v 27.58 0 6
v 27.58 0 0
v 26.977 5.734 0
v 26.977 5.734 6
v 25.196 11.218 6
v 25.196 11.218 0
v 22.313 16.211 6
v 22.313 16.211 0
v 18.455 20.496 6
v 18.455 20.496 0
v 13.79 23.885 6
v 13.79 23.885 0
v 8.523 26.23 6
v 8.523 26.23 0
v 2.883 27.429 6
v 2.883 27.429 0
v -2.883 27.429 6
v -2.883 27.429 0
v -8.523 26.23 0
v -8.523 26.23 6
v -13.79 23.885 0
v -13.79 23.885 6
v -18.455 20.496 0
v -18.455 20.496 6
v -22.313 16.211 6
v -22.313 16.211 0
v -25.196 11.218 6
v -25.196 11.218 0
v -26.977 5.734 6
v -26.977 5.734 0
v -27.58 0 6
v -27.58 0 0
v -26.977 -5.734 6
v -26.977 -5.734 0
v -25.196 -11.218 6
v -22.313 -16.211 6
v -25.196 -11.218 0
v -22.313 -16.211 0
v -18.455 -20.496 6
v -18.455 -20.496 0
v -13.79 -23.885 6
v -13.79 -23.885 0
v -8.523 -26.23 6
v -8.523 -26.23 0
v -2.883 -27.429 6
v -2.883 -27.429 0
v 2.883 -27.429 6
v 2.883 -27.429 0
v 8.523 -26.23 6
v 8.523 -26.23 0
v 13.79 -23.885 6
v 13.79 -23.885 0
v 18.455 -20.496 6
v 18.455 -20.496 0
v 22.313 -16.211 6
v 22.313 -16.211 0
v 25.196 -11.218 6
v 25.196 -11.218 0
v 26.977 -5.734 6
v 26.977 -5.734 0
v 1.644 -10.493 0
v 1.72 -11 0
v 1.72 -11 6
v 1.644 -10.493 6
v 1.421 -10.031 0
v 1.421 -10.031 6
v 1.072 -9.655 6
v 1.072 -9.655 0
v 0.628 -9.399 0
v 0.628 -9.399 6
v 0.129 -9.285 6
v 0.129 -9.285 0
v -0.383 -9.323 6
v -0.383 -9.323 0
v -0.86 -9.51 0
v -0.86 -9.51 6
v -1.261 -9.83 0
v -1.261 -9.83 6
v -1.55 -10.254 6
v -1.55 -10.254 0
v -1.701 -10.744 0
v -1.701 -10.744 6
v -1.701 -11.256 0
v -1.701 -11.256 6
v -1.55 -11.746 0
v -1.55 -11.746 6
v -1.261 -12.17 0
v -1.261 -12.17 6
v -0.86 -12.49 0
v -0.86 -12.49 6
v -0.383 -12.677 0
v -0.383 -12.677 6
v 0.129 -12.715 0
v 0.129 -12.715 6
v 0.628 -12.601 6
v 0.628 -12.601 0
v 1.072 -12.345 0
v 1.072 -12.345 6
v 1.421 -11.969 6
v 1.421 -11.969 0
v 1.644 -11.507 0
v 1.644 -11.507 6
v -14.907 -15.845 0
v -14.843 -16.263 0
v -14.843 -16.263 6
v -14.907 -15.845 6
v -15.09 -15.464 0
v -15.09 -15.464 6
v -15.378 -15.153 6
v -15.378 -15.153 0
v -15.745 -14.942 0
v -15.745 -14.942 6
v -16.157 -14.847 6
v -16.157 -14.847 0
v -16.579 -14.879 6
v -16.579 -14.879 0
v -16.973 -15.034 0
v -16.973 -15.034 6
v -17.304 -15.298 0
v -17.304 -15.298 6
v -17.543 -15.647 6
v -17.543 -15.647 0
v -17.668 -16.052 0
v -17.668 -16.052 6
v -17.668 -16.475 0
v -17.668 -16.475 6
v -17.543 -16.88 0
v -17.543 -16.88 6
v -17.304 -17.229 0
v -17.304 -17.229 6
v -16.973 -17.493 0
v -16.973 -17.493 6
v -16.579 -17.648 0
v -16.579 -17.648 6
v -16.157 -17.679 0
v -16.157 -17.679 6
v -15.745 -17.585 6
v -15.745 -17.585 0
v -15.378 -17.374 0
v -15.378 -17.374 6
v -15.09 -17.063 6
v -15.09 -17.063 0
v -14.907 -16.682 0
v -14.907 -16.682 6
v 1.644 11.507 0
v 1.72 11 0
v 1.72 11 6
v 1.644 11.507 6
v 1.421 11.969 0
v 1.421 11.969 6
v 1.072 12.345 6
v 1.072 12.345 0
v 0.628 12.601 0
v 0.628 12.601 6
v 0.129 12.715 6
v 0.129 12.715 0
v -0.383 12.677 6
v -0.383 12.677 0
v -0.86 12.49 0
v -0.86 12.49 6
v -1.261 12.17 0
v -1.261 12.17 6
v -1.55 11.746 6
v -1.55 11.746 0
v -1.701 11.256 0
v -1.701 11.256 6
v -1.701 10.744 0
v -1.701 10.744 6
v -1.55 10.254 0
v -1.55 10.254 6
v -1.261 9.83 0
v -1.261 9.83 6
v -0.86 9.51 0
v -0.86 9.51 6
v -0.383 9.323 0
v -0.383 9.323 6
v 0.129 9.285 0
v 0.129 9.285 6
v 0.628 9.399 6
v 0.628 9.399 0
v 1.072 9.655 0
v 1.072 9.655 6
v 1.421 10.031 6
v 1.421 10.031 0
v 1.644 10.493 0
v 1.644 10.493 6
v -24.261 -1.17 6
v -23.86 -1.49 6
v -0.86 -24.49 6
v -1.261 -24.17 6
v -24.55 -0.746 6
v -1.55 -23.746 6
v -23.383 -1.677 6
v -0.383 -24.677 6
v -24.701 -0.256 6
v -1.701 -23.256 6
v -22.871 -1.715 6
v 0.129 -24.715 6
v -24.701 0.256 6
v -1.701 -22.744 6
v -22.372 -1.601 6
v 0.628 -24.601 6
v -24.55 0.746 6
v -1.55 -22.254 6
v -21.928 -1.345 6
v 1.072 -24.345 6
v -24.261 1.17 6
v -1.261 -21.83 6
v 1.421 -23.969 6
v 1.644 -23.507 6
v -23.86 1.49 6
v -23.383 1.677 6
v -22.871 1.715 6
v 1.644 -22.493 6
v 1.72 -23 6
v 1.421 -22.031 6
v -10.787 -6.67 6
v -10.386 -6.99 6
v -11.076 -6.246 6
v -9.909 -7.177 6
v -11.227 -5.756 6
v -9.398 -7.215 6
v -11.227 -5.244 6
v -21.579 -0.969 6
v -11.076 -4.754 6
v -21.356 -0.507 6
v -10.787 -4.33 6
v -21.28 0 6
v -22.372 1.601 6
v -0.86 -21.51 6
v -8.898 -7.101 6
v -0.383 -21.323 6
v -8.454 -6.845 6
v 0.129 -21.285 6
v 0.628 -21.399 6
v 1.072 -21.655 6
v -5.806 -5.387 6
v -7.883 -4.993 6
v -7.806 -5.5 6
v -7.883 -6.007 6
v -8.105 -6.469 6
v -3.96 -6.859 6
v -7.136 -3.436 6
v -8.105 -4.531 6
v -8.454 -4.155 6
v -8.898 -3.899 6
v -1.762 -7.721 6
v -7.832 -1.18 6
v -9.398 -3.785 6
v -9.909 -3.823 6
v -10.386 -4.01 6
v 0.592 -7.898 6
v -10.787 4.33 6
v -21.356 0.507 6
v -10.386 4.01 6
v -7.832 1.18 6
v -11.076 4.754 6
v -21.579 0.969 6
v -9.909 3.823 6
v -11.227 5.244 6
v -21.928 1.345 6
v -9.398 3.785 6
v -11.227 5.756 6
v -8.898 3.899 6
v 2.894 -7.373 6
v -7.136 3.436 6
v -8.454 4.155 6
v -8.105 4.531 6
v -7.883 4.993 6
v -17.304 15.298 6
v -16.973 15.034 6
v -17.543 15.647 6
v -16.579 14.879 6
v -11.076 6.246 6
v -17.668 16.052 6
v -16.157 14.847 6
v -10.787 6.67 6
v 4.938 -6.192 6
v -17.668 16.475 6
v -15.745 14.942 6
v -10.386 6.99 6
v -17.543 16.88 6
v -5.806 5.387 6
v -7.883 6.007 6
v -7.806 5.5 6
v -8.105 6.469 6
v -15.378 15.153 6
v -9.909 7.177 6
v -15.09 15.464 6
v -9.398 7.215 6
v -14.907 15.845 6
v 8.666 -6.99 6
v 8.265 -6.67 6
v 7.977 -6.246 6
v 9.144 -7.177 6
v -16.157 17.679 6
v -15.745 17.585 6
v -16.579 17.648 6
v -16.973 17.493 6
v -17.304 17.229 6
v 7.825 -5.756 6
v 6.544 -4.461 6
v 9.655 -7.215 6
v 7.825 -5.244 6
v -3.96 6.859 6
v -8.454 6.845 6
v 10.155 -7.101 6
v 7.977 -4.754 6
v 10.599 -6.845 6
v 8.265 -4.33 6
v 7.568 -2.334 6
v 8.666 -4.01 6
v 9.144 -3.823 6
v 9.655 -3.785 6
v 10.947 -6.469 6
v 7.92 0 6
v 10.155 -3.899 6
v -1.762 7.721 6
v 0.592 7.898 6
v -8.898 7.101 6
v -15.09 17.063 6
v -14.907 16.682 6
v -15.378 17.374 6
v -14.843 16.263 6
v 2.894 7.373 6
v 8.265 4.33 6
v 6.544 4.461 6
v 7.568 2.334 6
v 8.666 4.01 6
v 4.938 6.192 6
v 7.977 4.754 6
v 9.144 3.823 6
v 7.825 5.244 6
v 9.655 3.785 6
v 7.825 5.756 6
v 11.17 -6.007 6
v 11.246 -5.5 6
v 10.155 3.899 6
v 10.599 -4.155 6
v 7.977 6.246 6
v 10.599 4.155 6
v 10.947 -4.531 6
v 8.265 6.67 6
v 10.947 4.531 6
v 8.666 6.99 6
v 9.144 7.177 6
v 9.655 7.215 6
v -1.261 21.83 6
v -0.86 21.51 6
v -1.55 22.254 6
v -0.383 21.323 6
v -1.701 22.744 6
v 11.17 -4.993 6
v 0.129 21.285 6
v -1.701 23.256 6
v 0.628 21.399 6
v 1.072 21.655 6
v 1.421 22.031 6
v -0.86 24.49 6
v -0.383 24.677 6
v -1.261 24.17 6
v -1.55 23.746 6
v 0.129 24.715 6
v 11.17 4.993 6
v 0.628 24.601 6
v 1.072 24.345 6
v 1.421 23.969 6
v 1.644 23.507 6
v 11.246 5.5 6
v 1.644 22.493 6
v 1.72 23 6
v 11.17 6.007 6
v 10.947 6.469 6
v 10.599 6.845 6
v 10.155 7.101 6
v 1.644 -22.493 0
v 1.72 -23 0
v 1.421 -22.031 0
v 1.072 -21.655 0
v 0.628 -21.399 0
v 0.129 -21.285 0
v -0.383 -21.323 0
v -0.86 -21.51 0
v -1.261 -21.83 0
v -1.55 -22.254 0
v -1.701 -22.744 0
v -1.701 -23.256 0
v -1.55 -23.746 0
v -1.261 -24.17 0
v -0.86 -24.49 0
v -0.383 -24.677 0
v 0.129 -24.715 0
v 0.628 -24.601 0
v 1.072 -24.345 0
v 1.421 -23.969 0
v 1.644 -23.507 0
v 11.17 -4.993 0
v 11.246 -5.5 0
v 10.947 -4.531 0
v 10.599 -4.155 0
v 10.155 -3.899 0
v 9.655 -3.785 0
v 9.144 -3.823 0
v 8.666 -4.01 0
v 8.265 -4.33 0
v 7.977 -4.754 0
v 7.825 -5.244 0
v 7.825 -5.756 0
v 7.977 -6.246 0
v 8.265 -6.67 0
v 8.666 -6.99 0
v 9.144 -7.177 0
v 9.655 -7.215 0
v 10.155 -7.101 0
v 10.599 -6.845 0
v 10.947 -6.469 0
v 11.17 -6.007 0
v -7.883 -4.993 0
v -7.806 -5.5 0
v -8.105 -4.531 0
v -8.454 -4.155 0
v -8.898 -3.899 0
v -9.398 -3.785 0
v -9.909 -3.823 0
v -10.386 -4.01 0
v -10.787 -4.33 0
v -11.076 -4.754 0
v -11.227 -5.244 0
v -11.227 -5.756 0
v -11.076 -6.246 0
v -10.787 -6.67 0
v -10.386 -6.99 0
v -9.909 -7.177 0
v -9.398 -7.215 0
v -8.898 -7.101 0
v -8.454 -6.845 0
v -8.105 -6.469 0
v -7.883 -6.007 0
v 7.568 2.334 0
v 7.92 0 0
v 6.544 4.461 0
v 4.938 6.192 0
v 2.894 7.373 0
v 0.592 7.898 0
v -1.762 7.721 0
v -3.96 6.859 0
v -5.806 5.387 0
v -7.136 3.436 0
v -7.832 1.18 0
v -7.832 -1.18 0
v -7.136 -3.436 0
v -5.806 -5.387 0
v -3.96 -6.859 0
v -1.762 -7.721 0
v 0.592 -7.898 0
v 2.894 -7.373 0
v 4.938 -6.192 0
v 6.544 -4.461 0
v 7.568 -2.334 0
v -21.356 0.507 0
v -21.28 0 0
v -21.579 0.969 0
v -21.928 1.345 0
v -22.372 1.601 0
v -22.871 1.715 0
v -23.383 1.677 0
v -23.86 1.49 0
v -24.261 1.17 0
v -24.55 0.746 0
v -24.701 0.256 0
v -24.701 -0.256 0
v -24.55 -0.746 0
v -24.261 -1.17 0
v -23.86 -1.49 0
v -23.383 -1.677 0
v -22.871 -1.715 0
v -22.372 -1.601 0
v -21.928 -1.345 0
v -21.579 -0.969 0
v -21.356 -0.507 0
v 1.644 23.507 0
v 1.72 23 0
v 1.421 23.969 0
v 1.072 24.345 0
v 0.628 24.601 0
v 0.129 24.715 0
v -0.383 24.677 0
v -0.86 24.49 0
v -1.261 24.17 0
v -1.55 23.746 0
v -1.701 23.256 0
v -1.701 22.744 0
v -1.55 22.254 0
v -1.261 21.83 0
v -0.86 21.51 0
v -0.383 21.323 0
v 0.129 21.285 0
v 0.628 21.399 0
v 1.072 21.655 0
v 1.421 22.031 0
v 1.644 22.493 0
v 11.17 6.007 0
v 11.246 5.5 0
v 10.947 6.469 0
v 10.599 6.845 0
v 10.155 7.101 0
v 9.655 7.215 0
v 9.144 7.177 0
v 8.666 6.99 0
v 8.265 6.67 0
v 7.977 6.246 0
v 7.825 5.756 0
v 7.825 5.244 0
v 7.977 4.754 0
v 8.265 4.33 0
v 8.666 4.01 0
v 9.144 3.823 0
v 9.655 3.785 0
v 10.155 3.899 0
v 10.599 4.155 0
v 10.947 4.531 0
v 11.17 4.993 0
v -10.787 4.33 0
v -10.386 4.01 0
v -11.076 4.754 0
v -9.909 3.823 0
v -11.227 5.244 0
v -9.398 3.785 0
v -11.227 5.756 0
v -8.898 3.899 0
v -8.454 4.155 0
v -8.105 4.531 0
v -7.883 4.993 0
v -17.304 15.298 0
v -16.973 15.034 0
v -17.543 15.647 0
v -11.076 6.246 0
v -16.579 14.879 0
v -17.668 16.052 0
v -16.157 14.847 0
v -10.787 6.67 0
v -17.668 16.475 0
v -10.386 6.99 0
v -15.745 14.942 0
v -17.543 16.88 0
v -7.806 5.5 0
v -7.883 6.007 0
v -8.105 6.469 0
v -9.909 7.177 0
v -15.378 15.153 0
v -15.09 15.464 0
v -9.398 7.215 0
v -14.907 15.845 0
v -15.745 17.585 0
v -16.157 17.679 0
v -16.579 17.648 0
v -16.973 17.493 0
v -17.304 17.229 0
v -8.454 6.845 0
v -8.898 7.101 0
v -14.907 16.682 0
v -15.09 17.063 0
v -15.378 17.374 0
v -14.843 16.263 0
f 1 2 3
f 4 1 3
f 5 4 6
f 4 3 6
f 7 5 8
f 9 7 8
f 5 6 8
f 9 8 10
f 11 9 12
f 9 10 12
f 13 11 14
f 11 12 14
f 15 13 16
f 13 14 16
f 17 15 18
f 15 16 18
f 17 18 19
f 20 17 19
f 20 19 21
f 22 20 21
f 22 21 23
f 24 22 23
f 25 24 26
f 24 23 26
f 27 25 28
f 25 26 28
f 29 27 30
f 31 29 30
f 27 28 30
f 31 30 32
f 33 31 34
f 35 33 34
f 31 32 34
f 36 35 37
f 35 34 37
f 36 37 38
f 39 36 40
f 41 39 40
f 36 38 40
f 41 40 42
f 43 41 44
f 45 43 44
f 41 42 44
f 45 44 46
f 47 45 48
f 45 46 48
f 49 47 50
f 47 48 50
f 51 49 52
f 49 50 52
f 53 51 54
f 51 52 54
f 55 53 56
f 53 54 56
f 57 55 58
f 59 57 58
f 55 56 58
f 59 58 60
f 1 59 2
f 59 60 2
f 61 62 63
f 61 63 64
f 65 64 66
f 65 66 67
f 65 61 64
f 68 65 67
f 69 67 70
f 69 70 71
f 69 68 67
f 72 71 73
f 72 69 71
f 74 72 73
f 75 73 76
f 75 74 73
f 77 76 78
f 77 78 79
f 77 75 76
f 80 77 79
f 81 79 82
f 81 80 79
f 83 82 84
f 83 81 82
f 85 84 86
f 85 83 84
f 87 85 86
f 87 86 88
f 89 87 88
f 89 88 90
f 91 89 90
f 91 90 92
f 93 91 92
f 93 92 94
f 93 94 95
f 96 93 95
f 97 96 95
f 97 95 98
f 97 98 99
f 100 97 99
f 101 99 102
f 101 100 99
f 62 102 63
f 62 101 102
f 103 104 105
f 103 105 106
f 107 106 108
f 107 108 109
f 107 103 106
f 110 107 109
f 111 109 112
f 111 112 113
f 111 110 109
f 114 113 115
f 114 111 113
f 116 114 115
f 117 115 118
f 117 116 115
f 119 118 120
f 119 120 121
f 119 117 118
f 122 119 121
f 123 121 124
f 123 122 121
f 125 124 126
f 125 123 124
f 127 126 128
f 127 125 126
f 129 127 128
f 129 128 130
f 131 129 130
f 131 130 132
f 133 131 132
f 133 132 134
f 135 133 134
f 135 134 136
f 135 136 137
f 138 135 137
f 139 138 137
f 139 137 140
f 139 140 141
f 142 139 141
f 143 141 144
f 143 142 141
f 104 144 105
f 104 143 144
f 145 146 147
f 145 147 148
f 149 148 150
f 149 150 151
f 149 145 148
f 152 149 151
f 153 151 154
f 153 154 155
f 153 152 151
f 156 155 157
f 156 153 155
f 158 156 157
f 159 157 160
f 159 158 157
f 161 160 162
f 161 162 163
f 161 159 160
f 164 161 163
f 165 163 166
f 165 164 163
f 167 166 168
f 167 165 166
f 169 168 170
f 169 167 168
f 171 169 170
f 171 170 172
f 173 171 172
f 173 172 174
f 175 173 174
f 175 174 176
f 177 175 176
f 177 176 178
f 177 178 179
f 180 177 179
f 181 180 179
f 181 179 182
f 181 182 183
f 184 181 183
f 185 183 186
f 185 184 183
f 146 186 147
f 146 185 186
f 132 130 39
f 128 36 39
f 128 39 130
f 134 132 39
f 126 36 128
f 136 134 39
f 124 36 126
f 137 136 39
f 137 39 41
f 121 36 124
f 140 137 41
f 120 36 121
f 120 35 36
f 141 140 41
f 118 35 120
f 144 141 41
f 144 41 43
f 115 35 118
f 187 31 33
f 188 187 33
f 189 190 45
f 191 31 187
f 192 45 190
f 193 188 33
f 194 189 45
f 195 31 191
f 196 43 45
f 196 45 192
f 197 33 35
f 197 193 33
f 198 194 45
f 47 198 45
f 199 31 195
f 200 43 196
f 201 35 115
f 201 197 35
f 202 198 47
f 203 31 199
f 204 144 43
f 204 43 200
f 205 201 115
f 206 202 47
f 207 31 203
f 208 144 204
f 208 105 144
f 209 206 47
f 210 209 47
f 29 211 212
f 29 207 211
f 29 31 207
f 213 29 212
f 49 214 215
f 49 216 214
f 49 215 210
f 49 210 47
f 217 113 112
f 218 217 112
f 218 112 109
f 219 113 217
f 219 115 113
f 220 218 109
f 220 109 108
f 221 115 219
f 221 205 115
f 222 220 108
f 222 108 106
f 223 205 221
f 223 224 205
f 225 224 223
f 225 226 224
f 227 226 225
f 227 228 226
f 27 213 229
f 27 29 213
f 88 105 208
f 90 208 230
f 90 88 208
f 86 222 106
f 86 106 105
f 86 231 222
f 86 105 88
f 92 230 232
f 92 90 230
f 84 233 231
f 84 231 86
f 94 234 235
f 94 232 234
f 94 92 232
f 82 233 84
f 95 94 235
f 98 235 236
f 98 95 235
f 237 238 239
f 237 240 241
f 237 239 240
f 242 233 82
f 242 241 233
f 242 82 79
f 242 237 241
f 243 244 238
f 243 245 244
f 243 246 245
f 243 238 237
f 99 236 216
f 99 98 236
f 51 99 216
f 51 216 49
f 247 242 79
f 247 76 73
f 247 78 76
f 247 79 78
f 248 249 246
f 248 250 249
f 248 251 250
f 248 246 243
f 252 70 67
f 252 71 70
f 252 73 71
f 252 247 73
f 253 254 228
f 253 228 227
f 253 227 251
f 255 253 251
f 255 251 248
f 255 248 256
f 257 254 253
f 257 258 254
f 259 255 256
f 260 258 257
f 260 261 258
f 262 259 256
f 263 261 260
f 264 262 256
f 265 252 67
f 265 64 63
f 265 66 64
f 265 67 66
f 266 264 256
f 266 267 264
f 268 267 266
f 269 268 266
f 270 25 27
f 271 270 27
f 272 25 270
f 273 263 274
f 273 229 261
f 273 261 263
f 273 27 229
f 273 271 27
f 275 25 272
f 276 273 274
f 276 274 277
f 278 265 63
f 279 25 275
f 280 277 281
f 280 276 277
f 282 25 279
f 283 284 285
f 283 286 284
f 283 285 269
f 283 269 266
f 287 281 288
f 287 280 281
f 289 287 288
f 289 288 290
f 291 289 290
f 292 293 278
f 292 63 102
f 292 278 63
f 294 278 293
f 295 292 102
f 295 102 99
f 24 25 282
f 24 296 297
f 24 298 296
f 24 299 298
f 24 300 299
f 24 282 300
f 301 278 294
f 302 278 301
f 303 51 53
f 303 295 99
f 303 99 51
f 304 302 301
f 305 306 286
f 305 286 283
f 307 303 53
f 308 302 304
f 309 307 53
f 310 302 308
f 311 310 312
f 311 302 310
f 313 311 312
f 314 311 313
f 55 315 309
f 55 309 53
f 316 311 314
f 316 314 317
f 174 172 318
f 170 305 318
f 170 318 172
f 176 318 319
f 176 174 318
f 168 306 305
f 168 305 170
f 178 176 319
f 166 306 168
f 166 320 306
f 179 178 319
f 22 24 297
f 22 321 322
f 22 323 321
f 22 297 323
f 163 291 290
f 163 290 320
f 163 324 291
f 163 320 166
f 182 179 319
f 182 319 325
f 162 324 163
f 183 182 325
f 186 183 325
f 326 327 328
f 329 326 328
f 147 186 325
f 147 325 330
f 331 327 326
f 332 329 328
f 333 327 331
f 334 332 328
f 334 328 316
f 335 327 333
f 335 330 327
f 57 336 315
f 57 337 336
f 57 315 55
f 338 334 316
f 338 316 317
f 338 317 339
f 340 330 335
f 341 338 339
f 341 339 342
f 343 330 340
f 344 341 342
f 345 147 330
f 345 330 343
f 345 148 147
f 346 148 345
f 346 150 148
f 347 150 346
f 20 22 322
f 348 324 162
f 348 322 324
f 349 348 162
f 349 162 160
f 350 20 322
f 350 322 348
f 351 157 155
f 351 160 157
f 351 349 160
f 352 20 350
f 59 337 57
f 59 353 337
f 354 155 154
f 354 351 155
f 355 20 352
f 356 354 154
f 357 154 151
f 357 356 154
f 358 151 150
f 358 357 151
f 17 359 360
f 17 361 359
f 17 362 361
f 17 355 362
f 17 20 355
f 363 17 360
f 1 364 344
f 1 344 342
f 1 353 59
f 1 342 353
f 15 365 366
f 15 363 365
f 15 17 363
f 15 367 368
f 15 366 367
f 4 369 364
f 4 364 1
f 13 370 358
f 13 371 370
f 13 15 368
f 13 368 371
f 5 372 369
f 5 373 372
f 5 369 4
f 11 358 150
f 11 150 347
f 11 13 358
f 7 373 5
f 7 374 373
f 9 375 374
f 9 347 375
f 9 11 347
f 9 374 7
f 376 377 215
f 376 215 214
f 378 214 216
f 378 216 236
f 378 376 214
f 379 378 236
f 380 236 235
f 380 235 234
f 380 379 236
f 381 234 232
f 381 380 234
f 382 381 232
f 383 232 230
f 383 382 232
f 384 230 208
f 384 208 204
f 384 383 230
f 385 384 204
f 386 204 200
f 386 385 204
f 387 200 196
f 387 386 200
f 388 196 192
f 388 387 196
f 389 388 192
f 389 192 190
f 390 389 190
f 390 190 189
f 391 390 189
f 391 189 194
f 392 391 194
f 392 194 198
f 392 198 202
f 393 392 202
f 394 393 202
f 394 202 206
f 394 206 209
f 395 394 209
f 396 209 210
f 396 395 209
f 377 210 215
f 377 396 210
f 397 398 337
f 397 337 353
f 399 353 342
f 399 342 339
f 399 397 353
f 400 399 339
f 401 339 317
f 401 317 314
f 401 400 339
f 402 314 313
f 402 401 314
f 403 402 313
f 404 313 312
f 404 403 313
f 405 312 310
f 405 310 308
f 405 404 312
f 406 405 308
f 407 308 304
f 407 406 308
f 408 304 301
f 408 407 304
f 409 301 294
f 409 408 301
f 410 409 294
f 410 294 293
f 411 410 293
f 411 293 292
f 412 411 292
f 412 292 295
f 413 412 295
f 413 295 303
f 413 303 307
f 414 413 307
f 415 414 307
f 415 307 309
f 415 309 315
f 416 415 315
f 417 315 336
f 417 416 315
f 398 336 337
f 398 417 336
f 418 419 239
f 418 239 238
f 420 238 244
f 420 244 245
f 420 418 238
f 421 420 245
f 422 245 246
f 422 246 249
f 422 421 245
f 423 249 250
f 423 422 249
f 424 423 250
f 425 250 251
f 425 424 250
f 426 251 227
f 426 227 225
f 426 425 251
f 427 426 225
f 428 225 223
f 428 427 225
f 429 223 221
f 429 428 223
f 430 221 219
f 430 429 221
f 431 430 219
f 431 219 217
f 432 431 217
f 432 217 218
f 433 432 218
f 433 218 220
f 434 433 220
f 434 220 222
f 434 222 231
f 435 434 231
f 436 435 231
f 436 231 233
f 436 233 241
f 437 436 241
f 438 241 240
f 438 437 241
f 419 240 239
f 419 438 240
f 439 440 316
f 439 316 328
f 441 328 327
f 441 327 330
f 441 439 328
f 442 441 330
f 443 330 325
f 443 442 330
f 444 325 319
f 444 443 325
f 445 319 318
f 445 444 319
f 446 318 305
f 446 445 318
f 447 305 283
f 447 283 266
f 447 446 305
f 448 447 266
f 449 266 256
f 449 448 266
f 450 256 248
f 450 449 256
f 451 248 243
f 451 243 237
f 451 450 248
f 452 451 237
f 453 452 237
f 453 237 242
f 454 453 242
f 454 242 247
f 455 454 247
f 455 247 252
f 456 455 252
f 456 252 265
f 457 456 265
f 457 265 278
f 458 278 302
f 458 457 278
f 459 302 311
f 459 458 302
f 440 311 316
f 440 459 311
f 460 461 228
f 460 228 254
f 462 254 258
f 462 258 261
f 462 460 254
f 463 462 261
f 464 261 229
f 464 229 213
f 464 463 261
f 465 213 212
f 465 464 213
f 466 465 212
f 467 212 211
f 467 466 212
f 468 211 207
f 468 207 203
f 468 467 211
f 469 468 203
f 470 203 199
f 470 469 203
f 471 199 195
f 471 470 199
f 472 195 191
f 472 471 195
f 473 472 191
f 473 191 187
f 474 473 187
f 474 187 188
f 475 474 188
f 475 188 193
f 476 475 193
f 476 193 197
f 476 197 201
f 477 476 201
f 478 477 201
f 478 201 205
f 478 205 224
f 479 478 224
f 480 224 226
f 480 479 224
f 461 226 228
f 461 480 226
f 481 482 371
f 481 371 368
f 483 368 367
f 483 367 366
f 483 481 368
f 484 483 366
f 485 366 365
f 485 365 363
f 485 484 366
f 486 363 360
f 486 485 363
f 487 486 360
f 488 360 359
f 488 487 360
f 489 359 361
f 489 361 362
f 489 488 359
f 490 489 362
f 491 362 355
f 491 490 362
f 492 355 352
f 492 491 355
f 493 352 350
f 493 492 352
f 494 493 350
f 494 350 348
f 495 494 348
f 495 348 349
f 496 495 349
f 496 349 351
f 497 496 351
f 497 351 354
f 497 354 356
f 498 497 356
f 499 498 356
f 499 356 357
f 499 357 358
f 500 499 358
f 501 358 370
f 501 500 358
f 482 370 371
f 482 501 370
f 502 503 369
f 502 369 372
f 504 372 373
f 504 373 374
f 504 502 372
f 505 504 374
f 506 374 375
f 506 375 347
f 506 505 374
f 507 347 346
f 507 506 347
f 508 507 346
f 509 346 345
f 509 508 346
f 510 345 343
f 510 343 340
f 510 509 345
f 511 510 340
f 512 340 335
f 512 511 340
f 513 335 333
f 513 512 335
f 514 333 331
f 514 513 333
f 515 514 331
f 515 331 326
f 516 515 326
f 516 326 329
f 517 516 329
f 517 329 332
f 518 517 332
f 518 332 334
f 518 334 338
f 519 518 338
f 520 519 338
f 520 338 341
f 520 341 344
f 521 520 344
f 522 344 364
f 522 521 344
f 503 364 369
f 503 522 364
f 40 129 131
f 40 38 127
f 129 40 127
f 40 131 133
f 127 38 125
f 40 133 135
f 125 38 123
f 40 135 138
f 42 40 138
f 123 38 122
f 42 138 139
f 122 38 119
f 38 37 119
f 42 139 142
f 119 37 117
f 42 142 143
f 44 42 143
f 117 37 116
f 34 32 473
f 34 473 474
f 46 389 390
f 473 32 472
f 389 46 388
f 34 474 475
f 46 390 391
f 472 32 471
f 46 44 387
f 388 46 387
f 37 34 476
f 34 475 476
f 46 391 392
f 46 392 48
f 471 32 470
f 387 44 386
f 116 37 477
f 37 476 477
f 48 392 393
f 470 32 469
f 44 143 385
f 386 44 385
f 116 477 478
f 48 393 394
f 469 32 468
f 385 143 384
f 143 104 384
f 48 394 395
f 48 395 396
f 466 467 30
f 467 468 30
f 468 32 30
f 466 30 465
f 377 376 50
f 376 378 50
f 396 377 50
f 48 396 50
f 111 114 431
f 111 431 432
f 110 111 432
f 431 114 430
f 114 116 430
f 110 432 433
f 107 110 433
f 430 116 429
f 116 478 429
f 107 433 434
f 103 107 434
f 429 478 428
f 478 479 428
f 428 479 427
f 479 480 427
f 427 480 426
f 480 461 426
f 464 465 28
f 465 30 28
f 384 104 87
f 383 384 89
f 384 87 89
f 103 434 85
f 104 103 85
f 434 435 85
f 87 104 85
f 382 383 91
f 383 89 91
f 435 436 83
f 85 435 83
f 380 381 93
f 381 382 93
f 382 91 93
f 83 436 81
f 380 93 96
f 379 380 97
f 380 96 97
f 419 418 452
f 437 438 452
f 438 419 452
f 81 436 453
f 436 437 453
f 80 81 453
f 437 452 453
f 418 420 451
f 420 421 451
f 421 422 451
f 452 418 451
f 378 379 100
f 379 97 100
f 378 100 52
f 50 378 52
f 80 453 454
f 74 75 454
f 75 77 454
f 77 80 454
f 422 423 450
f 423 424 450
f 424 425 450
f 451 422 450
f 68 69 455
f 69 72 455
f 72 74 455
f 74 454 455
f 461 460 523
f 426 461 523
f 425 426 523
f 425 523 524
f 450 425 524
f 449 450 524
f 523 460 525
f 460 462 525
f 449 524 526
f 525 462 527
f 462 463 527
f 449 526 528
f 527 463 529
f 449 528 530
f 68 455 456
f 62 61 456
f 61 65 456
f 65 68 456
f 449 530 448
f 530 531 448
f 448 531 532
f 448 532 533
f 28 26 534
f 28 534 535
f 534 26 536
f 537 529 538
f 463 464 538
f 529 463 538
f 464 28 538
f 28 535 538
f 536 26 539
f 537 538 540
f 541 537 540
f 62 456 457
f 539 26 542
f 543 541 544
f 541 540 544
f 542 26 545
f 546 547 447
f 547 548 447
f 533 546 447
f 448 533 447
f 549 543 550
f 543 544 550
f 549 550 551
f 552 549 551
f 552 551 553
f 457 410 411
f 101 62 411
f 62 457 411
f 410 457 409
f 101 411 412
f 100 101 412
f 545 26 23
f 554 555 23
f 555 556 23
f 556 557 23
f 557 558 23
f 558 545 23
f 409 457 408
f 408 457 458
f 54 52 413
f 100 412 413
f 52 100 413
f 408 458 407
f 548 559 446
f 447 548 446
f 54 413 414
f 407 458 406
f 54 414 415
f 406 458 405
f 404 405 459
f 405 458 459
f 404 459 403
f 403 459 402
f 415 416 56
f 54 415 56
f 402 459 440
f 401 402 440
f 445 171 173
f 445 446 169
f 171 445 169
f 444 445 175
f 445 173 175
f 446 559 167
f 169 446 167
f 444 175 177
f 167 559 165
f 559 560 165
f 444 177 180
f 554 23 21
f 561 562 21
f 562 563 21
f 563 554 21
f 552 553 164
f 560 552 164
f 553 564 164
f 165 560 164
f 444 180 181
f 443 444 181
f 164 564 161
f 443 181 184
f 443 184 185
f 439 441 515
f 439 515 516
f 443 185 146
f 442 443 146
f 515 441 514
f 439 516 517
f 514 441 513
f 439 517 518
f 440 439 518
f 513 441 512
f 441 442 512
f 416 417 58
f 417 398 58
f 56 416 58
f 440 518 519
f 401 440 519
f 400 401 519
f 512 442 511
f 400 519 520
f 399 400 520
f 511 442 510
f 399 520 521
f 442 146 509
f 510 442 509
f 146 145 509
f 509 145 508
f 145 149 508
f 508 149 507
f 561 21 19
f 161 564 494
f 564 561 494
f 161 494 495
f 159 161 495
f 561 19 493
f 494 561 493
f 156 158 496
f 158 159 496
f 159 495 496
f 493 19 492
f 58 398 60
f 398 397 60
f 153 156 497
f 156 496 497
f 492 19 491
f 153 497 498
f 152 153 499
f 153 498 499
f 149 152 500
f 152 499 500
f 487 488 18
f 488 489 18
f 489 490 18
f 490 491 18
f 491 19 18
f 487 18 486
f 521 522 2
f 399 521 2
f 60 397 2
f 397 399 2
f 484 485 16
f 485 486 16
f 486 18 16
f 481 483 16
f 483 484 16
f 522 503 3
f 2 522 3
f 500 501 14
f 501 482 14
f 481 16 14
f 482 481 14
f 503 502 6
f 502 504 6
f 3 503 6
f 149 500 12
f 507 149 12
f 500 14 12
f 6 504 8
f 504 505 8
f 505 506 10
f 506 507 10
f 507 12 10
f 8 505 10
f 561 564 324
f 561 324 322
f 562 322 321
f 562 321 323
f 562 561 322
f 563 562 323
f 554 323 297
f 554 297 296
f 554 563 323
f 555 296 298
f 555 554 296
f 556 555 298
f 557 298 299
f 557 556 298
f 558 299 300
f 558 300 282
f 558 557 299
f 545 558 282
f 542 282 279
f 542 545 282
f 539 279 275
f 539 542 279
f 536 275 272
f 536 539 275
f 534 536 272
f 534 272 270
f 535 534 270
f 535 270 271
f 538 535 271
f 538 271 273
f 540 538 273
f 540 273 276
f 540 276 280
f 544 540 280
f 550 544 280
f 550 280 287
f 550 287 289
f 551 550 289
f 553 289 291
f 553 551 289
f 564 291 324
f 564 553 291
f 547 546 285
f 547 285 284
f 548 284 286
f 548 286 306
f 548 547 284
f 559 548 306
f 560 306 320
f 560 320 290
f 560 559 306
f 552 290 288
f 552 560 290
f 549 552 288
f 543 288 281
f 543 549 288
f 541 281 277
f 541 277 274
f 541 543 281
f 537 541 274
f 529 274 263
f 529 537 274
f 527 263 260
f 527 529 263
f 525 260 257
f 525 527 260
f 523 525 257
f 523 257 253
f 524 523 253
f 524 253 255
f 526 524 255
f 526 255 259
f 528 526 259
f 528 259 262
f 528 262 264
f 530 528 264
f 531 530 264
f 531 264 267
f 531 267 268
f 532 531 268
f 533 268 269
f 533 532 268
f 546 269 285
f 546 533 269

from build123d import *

# Parameters (mm, degrees)
SKETCH1_R           = 27.5
SKETCH1_R_2         = 8
SKETCH1_R_3         = 1.8
SKETCH1_R_4         = 1.5
BOSS_EXTRUDE1_DEPTH = 6
MOVE_FACE1_BY       = 0.08
MOVE_FACE1_2_BY     = 0.08
MOVE_FACE1_3_BY     = 0.08
MOVE_FACE1_4_BY     = 0.08
MOVE_FACE1_5_BY     = 0.08
MOVE_FACE1_6_BY     = 0.08
MOVE_FACE1_7_BY     = 0.08
MOVE_FACE1_8_BY     = 0.08
MOVE_FACE1_9_BY     = 0.08
MOVE_FACE1_10_BY    = 0.08
MOVE_FACE1_11_BY    = 0.08
MOVE_FACE1_12_BY    = 0.08
MOVE_FACE1_13_BY    = 0.08


with BuildPart() as part:
    # Sketch1 → Boss-Extrude1 (new body)
    with BuildSketch(Plane.XY):
        Circle(SKETCH1_R)
        Circle(SKETCH1_R_2, mode=Mode.SUBTRACT)
        with Locations((0, 23)):
            Circle(SKETCH1_R_3, mode=Mode.SUBTRACT)
        with Locations((0, -23)):
            Circle(SKETCH1_R_3, mode=Mode.SUBTRACT)
        with Locations((-16.263455967, -16.263455967)):
            Circle(SKETCH1_R_4, mode=Mode.SUBTRACT)
        with Locations((-23, 0)):
            Circle(SKETCH1_R_3, mode=Mode.SUBTRACT)
        with Locations((-16.263455967, 16.263455967)):
            Circle(SKETCH1_R_4, mode=Mode.SUBTRACT)
        with Locations((0, 11)):
            Circle(SKETCH1_R_3, mode=Mode.SUBTRACT)
        with Locations((9.526279442, 5.5)):
            Circle(SKETCH1_R_3, mode=Mode.SUBTRACT)
        with Locations((9.526279442, -5.5)):
            Circle(SKETCH1_R_3, mode=Mode.SUBTRACT)
        with Locations((0, -11)):
            Circle(SKETCH1_R_3, mode=Mode.SUBTRACT)
        with Locations((-9.526279442, -5.5)):
            Circle(SKETCH1_R_3, mode=Mode.SUBTRACT)
        with Locations((-9.526279442, 5.5)):
            Circle(SKETCH1_R_3, mode=Mode.SUBTRACT)
    extrude(amount=BOSS_EXTRUDE1_DEPTH)

    # Move Face1: a curved face moved outward by 0.08
    add(Solid.thicken(part.faces().sort_by_distance((-17.763455967, -16.263455967, 3))[0], MOVE_FACE1_BY))

    # Move Face1 2: a curved face moved outward by 0.08
    add(Solid.thicken(part.faces().sort_by_distance((-24.8, 0, 3))[0], MOVE_FACE1_2_BY))

    # Move Face1 3: a curved face moved outward by 0.08
    add(Solid.thicken(part.faces().sort_by_distance((-17.763455967, 16.263455967, 3))[0], MOVE_FACE1_3_BY))

    # Move Face1 4: a curved face moved outward by 0.08
    add(Solid.thicken(part.faces().sort_by_distance((-1.8, 23, 3))[0], MOVE_FACE1_4_BY))

    # Move Face1 5: a curved face moved outward by 0.08
    add(Solid.thicken(part.faces().sort_by_distance((-27.5, 0, 3))[0], MOVE_FACE1_5_BY))

    # Move Face1 6: a curved face moved outward by 0.08
    add(Solid.thicken(part.faces().sort_by_distance((-8, 0, 3))[0], MOVE_FACE1_6_BY))

    # Move Face1 7: a curved face moved outward by 0.08
    add(Solid.thicken(part.faces().sort_by_distance((-1.8, 11, 3))[0], MOVE_FACE1_7_BY))

    # Move Face1 8: a curved face moved outward by 0.08
    add(Solid.thicken(part.faces().sort_by_distance((-1.8, -23, 3))[0], MOVE_FACE1_8_BY))

    # Move Face1 9: a curved face moved outward by 0.08
    add(Solid.thicken(part.faces().sort_by_distance((7.726279442, 5.5, 3))[0], MOVE_FACE1_9_BY))

    # Move Face1 10: a curved face moved outward by 0.08
    add(Solid.thicken(part.faces().sort_by_distance((7.726279442, -5.5, 3))[0], MOVE_FACE1_10_BY))

    # Move Face1 11: a curved face moved outward by 0.08
    add(Solid.thicken(part.faces().sort_by_distance((-1.8, -11, 3))[0], MOVE_FACE1_11_BY))

    # Move Face1 12: a curved face moved outward by 0.08
    add(Solid.thicken(part.faces().sort_by_distance((-11.326279442, -5.5, 3))[0], MOVE_FACE1_12_BY))

    # Move Face1 13: a curved face moved outward by 0.08
    add(Solid.thicken(part.faces().sort_by_distance((-11.326279442, 5.5, 3))[0], MOVE_FACE1_13_BY))


solid = part.part
